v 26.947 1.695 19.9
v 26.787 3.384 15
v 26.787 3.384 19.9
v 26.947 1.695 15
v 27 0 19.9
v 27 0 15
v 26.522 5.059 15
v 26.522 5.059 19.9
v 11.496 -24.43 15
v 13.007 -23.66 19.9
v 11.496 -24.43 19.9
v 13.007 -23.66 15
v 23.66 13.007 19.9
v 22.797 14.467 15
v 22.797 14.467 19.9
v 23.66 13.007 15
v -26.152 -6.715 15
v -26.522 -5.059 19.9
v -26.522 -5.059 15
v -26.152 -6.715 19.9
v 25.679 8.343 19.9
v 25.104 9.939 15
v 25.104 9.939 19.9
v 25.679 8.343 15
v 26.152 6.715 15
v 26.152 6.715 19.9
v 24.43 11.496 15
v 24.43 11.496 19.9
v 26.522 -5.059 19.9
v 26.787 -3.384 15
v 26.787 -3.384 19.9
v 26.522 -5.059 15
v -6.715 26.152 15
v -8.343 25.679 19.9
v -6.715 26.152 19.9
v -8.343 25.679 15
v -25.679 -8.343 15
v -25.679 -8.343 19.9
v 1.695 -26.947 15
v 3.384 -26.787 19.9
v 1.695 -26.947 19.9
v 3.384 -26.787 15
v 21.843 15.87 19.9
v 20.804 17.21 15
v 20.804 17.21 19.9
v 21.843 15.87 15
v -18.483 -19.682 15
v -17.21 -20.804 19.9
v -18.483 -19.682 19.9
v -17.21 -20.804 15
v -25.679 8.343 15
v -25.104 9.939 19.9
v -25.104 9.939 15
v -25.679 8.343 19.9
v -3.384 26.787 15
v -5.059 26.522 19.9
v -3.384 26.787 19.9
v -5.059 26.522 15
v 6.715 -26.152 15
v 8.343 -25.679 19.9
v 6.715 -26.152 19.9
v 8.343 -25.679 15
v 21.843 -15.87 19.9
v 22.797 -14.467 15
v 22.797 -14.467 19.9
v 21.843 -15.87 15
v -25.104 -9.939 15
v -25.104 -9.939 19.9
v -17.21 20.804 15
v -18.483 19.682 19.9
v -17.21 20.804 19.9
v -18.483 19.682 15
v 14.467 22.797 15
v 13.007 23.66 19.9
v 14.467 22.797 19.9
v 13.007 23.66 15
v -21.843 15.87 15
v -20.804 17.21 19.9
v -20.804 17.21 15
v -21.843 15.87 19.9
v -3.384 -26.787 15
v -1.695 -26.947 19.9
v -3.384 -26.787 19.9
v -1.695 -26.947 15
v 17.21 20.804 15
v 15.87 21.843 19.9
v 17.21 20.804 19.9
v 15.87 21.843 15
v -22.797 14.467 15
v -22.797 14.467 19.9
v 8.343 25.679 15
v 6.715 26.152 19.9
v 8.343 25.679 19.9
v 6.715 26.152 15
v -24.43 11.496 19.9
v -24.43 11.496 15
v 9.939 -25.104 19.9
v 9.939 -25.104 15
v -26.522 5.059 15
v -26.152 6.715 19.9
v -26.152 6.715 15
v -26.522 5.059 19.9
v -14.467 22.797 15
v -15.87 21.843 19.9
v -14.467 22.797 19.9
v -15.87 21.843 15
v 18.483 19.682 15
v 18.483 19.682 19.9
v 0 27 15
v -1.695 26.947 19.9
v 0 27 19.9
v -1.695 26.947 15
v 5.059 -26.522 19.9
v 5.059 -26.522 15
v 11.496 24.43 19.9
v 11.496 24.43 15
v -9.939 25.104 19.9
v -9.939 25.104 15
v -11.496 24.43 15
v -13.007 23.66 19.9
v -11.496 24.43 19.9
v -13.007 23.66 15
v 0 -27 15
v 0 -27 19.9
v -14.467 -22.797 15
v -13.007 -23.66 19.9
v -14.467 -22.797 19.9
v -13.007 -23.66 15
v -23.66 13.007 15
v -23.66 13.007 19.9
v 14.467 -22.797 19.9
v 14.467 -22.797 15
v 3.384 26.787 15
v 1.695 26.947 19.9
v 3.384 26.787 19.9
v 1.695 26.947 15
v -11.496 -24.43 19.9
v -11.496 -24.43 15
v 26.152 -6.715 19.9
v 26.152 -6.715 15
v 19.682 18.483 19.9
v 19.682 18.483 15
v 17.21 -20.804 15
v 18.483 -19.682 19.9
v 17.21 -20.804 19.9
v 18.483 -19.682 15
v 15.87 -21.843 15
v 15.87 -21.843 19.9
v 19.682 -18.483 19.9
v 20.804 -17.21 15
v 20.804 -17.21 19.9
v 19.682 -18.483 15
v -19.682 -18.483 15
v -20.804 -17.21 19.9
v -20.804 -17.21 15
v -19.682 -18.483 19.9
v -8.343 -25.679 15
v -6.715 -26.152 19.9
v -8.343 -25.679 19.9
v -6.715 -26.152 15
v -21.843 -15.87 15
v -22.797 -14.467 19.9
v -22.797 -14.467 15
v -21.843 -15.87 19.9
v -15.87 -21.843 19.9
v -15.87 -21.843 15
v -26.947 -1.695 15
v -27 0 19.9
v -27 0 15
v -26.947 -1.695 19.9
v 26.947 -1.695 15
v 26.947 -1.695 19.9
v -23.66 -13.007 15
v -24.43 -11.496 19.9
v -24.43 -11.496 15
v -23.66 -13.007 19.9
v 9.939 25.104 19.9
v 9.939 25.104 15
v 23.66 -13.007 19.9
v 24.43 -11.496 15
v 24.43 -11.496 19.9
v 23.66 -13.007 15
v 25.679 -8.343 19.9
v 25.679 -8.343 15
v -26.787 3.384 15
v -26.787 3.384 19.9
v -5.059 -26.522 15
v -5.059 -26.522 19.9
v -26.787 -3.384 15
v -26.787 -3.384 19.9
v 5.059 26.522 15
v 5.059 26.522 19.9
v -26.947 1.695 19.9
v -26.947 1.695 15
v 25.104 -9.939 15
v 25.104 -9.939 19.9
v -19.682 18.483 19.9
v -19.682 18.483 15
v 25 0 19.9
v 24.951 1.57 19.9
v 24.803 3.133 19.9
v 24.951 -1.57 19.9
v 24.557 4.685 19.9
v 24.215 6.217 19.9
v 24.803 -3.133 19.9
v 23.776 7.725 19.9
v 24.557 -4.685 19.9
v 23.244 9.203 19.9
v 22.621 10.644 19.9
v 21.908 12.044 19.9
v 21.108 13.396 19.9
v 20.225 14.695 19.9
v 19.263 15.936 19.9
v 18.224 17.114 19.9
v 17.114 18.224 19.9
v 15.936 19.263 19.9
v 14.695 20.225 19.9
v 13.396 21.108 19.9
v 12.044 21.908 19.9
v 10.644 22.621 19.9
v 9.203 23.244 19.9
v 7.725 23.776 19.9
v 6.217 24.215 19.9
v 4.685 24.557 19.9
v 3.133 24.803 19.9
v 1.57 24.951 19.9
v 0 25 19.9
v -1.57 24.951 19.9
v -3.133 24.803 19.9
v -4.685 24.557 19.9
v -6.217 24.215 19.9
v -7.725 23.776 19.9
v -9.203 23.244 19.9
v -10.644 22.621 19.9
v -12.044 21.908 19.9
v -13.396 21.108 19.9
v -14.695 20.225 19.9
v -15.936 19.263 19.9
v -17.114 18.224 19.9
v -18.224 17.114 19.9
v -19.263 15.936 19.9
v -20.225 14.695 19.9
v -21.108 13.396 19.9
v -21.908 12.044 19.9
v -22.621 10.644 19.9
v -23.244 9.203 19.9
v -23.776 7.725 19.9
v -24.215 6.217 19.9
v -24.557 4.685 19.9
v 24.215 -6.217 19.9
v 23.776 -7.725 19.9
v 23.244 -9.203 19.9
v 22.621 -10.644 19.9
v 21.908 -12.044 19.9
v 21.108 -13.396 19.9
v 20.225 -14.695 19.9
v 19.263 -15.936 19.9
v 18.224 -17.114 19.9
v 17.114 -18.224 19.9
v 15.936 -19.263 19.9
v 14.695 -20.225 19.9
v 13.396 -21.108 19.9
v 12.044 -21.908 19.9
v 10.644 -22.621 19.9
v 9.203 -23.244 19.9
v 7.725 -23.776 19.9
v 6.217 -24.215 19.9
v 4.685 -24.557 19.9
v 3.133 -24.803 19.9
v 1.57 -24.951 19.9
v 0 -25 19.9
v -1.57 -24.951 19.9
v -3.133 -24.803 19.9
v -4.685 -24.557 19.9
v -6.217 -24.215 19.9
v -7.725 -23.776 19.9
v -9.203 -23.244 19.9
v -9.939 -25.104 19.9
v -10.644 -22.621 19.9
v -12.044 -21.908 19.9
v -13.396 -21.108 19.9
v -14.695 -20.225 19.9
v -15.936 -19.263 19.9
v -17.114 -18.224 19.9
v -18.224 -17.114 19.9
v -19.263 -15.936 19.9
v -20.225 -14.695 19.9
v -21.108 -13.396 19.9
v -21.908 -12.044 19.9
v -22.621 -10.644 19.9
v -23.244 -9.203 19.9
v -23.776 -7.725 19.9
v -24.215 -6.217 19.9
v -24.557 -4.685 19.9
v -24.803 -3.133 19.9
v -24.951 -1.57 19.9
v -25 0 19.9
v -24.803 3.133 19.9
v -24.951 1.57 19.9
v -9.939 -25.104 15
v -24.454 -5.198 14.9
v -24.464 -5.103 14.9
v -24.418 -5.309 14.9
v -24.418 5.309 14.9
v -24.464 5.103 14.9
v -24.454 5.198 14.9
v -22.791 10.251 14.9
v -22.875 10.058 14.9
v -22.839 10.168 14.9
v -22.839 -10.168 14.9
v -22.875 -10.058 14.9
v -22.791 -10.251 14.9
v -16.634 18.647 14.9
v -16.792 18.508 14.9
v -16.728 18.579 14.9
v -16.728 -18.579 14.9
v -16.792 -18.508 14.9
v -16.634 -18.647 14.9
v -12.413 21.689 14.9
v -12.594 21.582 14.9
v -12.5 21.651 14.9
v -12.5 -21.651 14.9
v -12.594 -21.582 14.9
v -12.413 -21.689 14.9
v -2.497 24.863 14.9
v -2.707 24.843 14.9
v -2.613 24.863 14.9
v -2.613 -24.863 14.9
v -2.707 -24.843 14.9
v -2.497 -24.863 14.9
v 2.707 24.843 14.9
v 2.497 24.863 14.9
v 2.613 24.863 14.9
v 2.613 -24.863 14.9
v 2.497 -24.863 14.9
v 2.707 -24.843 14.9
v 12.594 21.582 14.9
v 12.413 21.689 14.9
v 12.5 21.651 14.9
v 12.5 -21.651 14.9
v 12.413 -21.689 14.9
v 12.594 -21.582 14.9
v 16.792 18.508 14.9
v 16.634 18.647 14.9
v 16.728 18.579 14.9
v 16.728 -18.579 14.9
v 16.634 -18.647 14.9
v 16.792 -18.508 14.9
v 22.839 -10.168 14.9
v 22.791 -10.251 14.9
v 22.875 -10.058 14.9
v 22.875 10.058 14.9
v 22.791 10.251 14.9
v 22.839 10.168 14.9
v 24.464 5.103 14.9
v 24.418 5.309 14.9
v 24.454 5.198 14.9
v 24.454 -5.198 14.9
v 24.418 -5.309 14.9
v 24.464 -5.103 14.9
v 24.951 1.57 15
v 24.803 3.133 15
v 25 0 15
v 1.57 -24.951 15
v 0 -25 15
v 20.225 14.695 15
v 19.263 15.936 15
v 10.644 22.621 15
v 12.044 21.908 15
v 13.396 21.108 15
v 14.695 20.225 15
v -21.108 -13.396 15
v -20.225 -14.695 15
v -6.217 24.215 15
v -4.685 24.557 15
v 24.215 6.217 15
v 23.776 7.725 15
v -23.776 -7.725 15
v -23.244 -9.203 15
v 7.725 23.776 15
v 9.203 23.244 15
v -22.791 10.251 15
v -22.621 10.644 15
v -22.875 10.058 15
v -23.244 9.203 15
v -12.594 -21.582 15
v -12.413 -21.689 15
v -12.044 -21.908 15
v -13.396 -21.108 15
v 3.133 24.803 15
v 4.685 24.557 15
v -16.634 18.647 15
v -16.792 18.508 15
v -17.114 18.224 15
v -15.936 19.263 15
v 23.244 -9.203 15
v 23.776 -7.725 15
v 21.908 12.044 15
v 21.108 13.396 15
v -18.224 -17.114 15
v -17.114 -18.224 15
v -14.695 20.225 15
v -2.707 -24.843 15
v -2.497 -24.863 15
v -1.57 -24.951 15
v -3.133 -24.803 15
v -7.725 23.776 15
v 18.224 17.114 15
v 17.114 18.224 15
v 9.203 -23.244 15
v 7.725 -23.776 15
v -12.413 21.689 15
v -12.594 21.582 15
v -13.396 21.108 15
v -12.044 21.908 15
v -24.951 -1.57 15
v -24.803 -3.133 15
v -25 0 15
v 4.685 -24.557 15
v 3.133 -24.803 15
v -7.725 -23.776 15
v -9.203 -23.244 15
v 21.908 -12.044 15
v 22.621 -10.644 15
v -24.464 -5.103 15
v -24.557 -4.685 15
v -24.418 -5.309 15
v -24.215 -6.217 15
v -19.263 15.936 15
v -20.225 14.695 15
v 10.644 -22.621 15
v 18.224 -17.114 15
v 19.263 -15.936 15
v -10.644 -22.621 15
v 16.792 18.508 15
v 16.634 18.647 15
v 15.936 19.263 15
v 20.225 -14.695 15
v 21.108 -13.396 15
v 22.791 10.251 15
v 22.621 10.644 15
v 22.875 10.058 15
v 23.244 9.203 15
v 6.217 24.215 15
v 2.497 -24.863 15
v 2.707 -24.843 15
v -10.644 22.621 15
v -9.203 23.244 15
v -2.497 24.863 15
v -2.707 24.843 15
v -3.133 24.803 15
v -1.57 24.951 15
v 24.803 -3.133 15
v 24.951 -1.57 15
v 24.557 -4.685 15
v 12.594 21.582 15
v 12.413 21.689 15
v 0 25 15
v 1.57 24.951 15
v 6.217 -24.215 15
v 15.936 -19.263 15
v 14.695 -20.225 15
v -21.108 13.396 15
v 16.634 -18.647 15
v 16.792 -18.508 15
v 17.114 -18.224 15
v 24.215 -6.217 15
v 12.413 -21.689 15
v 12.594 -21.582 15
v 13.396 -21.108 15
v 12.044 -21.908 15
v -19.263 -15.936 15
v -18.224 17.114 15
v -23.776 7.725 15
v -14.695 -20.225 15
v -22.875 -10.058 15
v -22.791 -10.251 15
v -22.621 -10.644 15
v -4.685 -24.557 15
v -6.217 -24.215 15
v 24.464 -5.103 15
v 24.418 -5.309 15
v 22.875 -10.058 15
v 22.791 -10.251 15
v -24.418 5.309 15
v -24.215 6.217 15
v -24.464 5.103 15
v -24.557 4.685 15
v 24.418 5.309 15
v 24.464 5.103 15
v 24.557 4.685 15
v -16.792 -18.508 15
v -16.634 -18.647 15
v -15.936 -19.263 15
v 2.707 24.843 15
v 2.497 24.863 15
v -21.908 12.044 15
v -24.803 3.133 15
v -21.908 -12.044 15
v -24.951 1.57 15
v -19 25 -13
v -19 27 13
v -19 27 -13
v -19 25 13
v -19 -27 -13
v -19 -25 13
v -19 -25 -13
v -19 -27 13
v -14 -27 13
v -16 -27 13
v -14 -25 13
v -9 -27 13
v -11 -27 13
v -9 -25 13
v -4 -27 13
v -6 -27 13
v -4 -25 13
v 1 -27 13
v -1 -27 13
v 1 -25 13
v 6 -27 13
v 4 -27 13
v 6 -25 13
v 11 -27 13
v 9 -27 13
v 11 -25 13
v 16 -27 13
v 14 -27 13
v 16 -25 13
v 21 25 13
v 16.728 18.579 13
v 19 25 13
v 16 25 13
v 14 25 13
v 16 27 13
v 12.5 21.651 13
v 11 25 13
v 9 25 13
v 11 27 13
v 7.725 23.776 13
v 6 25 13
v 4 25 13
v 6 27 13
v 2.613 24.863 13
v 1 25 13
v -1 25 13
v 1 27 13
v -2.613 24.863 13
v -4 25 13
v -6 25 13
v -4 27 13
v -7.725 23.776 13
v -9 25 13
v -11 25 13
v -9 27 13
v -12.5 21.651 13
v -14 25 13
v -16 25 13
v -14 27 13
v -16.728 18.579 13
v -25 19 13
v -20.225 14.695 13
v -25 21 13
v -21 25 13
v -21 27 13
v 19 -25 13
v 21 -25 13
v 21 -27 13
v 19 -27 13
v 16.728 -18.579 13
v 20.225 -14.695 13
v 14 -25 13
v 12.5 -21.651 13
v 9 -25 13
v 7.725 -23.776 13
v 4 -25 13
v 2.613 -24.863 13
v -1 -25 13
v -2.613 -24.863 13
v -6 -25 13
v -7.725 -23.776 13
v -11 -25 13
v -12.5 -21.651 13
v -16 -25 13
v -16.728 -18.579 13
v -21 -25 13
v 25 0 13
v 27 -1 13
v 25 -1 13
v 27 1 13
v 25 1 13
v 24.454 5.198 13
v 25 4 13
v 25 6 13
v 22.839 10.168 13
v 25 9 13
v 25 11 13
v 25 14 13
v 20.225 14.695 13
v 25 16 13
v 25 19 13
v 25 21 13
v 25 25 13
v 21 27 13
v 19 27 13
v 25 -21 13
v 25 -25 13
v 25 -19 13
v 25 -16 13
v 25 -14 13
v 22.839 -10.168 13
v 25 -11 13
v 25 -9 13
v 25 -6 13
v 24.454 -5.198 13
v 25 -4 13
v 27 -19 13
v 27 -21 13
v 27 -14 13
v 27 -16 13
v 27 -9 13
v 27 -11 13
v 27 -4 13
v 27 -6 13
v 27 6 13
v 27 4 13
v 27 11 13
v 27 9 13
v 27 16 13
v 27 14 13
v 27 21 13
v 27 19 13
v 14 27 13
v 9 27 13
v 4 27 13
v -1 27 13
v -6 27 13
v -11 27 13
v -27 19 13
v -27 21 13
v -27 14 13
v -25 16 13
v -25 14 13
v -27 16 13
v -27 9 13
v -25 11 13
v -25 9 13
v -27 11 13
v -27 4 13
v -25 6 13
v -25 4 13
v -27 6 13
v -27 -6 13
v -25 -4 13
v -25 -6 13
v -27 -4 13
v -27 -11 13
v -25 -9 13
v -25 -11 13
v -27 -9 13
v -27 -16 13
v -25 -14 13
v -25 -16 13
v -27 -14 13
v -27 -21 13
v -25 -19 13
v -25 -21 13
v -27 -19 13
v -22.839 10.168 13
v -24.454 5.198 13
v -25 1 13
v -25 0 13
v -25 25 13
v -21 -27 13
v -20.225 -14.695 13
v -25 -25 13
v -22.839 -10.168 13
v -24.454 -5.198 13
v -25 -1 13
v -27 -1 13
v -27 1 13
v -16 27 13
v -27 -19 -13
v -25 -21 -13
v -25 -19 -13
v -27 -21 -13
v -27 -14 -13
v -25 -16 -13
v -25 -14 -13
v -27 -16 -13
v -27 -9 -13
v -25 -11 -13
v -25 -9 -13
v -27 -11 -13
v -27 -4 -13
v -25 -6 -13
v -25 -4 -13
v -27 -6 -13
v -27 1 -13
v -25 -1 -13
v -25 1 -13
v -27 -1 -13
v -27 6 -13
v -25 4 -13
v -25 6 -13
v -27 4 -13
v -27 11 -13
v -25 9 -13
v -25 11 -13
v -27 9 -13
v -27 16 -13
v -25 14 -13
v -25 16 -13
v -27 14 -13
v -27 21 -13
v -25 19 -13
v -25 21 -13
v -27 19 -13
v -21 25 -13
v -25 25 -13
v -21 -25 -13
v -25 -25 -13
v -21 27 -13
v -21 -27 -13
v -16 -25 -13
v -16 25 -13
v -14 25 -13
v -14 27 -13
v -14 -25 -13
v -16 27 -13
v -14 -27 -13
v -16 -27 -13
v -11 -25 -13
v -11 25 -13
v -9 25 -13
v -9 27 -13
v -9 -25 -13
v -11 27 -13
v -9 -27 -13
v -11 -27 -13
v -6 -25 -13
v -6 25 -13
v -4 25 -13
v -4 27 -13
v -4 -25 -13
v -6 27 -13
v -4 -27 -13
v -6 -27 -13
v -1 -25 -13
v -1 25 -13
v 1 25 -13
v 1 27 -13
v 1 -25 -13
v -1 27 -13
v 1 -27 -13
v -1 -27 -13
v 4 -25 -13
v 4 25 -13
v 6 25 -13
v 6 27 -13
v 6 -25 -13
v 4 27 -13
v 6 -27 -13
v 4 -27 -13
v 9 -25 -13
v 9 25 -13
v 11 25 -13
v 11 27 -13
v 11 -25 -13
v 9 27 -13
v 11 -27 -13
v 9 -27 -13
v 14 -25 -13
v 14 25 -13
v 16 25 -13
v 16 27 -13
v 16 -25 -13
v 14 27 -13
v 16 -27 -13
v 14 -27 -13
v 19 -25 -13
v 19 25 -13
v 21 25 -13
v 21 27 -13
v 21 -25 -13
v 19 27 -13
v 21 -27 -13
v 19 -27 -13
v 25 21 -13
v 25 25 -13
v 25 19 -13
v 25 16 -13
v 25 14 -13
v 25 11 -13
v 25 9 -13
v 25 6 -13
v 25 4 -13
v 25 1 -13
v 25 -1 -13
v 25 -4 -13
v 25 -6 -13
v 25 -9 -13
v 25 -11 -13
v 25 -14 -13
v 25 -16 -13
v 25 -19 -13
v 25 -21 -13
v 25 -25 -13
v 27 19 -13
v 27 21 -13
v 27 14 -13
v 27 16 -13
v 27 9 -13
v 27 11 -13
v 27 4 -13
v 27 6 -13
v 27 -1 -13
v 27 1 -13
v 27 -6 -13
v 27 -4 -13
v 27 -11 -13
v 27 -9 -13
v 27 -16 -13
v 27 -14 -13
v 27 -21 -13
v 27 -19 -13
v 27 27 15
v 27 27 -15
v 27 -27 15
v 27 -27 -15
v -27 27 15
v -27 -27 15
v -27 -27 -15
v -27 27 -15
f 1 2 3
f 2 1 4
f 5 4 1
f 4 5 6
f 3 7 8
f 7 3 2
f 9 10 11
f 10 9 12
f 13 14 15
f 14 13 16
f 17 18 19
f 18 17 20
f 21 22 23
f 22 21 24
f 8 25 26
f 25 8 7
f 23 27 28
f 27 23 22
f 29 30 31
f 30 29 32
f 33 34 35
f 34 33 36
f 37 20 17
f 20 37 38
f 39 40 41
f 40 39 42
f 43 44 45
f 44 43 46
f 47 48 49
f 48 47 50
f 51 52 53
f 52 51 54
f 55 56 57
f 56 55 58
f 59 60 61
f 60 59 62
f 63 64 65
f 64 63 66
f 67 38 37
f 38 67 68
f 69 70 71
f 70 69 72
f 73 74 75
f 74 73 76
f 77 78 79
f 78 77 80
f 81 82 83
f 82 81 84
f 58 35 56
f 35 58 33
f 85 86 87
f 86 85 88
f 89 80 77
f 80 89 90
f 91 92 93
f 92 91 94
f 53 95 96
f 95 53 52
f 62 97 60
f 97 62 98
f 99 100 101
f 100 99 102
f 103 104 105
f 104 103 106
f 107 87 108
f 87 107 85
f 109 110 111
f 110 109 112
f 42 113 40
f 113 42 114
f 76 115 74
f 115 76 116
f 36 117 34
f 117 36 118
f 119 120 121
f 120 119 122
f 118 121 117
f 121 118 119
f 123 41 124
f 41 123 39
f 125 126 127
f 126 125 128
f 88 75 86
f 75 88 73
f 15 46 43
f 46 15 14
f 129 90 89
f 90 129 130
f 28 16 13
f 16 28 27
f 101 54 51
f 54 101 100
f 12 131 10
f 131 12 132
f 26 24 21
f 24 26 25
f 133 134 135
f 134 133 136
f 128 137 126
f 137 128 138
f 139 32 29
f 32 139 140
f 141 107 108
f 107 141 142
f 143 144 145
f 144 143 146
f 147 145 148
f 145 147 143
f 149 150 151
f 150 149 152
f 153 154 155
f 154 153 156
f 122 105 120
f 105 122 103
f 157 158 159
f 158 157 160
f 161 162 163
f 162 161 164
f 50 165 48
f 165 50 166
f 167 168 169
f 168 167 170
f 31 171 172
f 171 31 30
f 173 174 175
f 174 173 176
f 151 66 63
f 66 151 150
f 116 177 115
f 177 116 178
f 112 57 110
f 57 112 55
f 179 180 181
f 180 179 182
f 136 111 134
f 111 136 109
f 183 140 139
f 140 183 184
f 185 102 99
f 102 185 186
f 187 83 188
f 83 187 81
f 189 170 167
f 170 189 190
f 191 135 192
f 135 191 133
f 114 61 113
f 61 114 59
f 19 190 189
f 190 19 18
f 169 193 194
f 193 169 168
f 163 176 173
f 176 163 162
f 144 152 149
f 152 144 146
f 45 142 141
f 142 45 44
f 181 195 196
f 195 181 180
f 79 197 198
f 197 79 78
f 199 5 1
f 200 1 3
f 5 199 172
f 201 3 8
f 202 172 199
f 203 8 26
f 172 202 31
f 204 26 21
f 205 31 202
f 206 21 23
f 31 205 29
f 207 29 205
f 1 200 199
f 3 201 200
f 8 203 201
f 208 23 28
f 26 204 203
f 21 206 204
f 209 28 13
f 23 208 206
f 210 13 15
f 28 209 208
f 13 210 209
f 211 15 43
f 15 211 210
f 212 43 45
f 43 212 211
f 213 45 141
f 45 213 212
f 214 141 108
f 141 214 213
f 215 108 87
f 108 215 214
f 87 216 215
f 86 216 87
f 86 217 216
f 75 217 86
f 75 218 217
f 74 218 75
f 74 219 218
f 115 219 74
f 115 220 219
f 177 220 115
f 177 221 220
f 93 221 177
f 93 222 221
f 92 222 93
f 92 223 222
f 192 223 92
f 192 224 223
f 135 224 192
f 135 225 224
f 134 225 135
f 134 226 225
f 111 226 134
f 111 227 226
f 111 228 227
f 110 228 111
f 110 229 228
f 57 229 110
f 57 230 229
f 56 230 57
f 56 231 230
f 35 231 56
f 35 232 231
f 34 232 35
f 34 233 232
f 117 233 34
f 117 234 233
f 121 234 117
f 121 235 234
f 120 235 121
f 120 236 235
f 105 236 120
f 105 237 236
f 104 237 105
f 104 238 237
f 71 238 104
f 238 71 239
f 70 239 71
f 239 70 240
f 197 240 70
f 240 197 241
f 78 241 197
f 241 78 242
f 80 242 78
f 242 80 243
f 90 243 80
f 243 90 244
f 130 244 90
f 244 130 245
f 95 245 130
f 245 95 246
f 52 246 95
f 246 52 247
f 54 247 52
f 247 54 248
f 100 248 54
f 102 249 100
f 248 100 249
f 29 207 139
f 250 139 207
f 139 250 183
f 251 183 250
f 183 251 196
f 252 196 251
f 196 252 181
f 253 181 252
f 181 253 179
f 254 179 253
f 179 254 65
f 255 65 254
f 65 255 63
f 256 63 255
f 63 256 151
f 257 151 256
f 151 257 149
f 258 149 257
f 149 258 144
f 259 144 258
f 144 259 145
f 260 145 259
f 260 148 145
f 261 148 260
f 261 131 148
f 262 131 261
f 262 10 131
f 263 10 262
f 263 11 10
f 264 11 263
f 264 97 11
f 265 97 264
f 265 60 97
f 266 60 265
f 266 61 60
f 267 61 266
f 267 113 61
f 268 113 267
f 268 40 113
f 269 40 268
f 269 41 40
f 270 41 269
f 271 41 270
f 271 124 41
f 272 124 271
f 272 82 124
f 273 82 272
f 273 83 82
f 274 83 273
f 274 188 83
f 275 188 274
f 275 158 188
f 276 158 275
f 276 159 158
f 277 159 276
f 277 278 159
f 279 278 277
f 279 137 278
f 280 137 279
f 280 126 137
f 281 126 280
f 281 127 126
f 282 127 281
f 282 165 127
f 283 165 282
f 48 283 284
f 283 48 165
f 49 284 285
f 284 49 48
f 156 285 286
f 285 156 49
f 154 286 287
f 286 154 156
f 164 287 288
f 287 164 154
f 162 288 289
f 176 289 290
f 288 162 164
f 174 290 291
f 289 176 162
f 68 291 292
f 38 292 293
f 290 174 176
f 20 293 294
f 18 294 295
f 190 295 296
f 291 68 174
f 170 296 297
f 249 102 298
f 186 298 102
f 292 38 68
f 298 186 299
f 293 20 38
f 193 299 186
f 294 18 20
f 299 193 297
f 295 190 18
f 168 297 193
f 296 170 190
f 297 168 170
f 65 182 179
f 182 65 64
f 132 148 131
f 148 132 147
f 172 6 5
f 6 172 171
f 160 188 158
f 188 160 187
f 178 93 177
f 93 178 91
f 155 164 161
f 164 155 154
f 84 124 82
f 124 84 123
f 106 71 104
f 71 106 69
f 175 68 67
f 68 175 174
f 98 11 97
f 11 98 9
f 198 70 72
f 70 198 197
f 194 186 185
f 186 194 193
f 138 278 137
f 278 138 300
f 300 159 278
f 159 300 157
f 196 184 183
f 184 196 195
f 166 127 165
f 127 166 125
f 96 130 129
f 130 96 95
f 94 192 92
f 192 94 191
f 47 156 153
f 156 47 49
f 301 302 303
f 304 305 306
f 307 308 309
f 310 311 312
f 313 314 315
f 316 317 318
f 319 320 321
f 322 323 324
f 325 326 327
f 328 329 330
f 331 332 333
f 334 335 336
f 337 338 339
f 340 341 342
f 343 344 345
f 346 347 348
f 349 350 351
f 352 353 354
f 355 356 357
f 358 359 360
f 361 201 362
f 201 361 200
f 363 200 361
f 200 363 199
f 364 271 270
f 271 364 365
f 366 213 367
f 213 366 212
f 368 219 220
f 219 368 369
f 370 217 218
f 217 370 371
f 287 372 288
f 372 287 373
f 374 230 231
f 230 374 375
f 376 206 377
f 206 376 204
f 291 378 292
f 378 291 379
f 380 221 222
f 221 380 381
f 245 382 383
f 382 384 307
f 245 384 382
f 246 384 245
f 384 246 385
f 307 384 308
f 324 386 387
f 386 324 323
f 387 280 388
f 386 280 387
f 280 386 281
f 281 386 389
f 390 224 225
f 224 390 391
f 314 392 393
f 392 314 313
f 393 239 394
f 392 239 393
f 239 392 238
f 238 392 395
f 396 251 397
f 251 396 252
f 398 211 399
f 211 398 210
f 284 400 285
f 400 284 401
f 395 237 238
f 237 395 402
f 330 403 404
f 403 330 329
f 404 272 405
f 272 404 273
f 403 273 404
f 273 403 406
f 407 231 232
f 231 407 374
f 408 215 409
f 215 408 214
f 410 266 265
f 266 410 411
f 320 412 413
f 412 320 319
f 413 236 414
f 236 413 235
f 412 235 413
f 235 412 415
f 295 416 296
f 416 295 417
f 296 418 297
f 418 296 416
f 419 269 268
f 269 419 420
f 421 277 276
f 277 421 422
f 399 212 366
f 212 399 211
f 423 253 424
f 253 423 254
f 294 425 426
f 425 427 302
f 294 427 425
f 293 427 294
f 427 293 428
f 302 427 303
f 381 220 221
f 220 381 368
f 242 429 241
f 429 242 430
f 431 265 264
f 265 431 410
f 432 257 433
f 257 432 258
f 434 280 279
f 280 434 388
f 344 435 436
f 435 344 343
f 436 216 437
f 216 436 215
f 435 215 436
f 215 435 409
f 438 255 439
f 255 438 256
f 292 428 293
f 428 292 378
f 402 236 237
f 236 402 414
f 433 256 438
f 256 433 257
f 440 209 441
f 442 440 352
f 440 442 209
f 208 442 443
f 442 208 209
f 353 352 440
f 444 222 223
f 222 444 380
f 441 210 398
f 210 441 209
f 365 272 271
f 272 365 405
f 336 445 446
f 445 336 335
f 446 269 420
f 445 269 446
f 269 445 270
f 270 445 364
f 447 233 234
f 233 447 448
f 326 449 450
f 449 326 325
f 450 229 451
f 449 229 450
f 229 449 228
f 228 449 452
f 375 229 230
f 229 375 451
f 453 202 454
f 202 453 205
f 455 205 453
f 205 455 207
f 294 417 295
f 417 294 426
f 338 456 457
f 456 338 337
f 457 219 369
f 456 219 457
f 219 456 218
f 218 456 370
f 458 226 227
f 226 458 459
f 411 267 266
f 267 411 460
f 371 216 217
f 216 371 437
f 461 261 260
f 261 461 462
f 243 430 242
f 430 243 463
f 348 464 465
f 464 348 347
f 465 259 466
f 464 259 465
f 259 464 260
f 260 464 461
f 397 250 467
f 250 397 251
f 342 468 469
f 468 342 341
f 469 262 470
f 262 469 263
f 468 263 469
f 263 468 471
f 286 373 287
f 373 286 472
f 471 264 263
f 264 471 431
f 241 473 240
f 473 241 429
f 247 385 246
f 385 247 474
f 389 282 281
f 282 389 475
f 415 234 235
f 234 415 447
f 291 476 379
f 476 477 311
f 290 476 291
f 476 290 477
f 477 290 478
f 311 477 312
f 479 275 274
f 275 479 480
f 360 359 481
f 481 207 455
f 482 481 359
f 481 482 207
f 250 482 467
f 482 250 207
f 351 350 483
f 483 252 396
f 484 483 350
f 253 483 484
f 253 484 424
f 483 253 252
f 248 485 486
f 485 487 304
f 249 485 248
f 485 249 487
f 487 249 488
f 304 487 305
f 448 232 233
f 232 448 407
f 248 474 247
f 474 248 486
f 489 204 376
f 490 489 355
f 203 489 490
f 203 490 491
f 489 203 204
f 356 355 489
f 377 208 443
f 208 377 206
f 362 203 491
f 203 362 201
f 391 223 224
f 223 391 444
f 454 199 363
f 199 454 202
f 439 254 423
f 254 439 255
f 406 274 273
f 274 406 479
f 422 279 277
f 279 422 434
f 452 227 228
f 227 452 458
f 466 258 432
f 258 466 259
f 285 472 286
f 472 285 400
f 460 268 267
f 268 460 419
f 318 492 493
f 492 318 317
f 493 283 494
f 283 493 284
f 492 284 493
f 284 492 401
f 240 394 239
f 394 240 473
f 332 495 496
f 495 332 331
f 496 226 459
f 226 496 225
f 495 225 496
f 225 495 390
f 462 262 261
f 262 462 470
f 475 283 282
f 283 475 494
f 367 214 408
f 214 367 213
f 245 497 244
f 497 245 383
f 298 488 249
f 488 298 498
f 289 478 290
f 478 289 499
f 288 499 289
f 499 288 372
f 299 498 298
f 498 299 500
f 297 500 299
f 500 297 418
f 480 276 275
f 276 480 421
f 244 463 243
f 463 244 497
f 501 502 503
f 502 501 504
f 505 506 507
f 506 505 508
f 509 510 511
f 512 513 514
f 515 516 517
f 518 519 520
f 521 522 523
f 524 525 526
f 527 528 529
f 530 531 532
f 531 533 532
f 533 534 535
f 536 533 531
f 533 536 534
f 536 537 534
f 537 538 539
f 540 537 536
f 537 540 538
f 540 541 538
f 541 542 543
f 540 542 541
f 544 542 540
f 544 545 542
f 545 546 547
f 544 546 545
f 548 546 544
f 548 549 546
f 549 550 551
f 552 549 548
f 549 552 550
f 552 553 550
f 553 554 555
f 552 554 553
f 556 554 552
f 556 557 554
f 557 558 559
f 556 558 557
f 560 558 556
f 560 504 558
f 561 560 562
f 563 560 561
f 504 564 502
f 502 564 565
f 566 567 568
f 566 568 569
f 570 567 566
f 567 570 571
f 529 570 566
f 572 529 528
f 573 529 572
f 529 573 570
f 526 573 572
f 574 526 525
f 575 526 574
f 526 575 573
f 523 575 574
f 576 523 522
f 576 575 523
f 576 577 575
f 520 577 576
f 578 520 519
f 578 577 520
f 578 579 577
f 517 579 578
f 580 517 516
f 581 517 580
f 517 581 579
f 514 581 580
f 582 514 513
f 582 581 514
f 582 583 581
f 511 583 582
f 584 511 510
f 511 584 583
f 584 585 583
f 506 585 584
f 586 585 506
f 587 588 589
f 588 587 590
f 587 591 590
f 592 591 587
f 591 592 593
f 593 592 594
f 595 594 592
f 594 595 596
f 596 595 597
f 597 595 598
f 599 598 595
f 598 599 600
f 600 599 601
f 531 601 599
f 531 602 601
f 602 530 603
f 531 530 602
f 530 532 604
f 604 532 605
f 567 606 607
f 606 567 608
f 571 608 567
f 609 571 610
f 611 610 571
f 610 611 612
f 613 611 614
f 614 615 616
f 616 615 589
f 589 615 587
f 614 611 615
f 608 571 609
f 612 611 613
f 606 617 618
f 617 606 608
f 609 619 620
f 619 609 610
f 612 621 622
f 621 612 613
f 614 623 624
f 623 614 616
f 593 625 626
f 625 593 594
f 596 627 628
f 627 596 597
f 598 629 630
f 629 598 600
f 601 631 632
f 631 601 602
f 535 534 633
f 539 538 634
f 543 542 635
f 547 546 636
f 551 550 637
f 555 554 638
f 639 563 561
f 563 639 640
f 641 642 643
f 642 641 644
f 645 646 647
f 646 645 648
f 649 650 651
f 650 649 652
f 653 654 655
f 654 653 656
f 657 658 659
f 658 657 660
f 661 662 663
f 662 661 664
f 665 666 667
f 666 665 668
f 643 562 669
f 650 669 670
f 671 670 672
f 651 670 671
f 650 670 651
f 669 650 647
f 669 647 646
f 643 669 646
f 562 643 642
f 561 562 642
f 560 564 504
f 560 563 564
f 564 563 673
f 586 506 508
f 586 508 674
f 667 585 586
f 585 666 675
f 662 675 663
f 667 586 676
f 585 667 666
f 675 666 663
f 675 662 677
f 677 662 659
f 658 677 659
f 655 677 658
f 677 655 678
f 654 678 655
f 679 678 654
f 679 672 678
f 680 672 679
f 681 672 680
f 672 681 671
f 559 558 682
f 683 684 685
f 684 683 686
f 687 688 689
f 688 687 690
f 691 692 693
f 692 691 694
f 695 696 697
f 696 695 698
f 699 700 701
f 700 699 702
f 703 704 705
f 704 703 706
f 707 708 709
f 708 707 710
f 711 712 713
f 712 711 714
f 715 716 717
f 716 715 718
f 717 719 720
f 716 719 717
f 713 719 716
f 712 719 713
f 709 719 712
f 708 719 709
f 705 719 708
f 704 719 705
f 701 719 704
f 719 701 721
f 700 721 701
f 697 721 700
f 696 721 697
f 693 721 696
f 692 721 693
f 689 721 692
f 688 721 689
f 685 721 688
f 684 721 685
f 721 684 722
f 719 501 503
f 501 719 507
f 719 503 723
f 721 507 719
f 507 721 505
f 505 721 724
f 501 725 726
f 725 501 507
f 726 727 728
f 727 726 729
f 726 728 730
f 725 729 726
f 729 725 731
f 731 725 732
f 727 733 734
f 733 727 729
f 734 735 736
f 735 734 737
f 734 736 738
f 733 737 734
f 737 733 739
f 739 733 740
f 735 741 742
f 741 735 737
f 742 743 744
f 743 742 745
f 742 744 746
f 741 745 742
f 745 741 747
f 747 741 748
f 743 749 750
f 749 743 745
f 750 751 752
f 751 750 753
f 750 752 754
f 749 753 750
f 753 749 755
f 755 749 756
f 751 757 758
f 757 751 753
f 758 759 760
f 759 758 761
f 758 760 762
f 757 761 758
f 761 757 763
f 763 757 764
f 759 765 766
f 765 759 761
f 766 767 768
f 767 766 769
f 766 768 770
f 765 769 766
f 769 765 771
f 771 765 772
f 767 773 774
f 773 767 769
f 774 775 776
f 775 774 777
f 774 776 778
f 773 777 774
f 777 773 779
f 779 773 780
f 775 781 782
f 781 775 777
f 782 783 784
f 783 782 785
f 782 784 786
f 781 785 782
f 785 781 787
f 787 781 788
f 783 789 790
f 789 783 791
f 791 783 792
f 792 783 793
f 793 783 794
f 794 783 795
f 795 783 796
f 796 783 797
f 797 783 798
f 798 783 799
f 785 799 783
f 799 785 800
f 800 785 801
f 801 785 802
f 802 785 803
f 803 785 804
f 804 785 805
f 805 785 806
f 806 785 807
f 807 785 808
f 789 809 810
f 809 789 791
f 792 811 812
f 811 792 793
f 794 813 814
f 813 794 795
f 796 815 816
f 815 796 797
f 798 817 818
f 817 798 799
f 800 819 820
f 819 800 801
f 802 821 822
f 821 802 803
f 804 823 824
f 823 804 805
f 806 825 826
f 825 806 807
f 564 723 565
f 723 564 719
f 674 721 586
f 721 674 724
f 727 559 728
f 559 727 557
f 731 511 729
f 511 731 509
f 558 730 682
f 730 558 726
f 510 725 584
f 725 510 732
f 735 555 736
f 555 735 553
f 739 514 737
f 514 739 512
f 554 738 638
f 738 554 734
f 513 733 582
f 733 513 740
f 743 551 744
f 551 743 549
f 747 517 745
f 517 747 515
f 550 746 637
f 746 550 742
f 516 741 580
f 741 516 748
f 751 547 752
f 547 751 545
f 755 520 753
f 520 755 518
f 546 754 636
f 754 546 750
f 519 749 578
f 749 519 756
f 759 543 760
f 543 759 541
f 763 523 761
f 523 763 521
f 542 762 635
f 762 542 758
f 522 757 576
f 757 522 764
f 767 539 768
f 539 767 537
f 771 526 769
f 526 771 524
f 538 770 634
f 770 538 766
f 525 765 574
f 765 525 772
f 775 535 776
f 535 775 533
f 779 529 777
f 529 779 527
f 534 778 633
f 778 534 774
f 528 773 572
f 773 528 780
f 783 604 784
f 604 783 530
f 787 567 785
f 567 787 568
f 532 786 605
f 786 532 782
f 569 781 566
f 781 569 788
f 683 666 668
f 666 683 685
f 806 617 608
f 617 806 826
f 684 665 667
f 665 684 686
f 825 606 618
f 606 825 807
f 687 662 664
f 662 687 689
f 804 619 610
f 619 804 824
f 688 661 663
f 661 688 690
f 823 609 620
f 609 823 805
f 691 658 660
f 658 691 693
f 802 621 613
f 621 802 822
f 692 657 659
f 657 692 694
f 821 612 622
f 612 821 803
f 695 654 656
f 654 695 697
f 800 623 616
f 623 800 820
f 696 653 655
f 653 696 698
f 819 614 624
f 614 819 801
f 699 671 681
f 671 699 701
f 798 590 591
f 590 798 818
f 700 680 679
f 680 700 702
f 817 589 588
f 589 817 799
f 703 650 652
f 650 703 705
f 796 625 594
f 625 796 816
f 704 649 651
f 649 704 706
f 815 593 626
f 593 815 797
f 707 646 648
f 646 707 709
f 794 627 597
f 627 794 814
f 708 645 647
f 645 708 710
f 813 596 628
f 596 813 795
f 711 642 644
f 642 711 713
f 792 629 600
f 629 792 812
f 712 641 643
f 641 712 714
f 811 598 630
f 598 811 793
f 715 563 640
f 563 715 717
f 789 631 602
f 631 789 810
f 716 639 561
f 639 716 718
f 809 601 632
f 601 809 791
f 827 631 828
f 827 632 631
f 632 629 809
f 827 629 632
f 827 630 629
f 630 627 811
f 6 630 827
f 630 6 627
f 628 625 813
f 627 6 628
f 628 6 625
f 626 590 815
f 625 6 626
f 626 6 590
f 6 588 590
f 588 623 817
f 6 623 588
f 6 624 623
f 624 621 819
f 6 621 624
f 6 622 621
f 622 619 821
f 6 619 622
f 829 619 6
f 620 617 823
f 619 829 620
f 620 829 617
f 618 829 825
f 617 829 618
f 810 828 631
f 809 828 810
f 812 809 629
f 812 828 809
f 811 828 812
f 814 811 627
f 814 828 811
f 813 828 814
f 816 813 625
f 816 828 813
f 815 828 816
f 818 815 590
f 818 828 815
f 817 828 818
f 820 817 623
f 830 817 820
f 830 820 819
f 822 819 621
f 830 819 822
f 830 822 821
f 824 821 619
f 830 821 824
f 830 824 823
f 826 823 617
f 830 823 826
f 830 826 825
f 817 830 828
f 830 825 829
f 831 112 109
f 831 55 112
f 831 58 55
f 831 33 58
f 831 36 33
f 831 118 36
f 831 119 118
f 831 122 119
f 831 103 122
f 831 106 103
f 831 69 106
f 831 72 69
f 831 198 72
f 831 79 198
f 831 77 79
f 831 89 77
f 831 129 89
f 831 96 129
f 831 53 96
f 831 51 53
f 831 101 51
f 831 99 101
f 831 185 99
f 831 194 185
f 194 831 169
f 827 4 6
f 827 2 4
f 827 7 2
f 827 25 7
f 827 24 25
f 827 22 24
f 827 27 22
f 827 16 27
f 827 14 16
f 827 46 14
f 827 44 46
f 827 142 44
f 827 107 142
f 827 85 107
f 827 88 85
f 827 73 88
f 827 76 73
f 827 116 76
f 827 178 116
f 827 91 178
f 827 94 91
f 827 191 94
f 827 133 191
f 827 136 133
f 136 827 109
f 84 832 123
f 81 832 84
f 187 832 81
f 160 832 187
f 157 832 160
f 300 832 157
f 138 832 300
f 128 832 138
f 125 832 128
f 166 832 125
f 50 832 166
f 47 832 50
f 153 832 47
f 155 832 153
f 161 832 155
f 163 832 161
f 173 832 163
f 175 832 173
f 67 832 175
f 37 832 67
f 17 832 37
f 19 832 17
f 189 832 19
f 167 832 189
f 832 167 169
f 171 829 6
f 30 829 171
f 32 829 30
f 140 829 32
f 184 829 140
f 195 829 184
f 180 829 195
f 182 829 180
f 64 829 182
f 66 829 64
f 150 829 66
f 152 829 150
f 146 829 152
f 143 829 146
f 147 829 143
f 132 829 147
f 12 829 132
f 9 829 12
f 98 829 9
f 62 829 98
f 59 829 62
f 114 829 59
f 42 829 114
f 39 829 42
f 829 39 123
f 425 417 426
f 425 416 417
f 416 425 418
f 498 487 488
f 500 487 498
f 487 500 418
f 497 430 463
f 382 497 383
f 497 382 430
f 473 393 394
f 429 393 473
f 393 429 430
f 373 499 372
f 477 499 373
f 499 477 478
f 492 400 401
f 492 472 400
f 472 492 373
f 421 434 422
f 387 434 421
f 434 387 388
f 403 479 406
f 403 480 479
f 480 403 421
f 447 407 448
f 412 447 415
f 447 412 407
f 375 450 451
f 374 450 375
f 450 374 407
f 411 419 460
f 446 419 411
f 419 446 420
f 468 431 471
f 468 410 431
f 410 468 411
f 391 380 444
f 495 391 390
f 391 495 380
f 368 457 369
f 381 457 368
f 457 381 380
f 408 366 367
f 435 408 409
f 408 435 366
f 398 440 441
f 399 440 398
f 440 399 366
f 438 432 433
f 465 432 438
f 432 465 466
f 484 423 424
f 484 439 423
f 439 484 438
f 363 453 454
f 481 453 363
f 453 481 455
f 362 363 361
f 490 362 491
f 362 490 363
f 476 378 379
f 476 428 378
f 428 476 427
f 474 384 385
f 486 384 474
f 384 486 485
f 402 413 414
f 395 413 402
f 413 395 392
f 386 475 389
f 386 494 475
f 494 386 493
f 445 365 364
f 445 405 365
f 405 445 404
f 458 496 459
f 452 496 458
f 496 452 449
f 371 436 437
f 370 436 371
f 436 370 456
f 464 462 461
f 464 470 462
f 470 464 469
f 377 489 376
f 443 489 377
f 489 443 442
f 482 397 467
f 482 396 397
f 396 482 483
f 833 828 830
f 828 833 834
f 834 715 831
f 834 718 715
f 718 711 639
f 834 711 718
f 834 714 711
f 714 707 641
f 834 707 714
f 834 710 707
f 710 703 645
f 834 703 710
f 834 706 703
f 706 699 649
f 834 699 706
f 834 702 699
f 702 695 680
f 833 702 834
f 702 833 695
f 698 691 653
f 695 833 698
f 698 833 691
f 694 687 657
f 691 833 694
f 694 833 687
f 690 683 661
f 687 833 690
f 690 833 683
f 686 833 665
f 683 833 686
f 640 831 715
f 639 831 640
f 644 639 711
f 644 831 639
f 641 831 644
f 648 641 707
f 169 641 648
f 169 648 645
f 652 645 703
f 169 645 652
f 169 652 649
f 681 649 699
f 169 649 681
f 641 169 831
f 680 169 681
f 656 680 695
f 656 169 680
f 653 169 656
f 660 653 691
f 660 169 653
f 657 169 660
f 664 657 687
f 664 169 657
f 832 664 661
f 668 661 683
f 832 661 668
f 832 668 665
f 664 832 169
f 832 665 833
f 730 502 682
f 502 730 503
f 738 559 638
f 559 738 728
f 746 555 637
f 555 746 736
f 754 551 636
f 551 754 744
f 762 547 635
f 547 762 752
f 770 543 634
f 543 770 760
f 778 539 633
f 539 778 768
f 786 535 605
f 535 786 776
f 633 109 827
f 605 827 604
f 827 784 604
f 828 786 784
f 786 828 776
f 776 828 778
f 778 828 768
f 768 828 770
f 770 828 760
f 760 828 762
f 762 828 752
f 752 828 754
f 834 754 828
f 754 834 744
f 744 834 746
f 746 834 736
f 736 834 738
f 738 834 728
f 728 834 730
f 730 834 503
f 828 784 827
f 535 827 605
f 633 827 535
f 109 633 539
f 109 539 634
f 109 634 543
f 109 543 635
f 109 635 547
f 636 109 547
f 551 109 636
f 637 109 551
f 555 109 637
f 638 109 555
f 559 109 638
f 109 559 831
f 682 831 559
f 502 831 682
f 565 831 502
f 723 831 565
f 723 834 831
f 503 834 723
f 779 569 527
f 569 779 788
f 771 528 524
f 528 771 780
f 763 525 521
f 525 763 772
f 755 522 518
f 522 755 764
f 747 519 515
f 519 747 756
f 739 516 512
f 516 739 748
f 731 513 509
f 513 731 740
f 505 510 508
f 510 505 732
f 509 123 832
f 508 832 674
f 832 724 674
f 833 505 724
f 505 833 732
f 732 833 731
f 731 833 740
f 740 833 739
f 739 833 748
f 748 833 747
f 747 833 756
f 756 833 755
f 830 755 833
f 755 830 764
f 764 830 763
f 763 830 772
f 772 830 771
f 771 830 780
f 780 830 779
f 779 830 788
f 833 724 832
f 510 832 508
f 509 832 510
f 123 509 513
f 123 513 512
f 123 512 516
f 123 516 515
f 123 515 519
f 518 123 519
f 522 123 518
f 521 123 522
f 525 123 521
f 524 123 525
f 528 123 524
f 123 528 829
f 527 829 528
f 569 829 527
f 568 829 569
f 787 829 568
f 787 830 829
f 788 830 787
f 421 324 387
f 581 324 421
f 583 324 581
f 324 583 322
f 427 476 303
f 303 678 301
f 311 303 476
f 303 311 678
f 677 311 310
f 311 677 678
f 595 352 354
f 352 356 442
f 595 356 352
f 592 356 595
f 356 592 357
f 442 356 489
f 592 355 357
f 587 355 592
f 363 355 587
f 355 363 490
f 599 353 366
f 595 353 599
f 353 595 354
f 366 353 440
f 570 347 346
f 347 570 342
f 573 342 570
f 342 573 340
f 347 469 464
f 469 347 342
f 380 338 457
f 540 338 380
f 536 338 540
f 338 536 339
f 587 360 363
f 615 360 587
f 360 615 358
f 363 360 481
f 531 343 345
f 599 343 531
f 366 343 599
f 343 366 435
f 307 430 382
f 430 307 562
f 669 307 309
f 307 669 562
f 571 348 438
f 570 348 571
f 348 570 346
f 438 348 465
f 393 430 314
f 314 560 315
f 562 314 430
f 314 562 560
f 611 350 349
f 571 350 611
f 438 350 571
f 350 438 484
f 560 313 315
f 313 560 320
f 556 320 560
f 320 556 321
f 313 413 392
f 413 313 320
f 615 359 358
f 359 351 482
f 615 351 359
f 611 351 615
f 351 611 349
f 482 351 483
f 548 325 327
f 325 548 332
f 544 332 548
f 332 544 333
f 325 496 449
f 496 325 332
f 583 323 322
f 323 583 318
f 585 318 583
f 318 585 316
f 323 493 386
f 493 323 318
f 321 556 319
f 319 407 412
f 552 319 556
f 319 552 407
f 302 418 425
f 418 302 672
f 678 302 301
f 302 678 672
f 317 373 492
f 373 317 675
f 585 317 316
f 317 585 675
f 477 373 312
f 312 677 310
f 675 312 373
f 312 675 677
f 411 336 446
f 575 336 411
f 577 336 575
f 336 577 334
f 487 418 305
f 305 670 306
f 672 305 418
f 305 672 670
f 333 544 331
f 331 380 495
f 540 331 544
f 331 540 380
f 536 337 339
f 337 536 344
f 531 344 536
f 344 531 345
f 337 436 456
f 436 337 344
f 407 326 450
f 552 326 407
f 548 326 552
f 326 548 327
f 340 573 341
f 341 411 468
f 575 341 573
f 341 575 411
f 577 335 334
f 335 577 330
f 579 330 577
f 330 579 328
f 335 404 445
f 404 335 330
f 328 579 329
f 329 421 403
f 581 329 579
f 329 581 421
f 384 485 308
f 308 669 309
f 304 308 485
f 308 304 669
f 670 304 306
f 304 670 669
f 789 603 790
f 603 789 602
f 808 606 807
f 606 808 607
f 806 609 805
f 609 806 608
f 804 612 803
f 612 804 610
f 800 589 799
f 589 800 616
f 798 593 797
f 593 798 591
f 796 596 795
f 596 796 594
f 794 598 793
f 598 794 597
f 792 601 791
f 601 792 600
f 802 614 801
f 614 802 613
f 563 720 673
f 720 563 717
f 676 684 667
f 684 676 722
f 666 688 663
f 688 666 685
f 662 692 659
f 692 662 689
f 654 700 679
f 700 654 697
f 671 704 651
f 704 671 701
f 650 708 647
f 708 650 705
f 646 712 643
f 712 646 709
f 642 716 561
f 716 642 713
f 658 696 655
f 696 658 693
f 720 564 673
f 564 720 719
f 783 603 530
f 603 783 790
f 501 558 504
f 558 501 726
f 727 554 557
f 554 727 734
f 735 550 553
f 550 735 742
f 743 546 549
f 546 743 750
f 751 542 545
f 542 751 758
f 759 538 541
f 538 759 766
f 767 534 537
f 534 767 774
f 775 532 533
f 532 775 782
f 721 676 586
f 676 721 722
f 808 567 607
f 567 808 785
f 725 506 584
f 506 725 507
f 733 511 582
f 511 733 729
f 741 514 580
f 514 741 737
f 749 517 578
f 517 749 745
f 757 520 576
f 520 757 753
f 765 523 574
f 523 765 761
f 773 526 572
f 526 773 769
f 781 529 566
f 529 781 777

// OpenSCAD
// file: ../../../../shapes/open-cylinder/open-cylinder.scad
// // TODO: Lower this to 50.
module openCylinder(height = 3,
                    outerRadius = 7,
                    innerRadius = 4.5,
                    fn = 100)
{
echo("hi oc");    
    $fn = fn;

    difference()
    {
        cylinder(r=outerRadius,
                 h=height);

        translate([0, 0, -1])
        cylinder(r=innerRadius,
                 h=height+1.01);
    }
}
// file: ../../water-pump-filter.scad
use <../../shapes/open-cylinder/open-cylinder.scad>

module waterPumpFilter(baseHeight = 30,
					   innerRadius = 25)
{
	union()
	{
		zTranslate = baseHeight / 2.0;
		translate([0,0, zTranslate-0.1])
		waterPumpFilter_connector(innerRadius = innerRadius);

		xyLength = (innerRadius * 2) + 4;
		waterPumpFilter_base(height = baseHeight,
							 innerRadius = innerRadius,
							 xLength = xyLength,
							 yLength = xyLength);
	}
}

module waterPumpFilter_connector(innerRadius)
{
	openCylinder(height = 5,
				 innerRadius = innerRadius,
				 outerRadius = innerRadius + 2);
}

module waterPumpFilter_base(height,
														innerRadius,
														xLength,
														yLength)
{
	difference()
	{
		// this is the outer cube
		cube([xLength, yLength, height], center = true);

		color("pink")
		translate([0,0,10])
		cylinder(r=innerRadius, h=30, center=true);

		innerCubeDifference = 4;
		color("green")
		waterPumpFilter_base_innerCube(xLength - innerCubeDifference, height - innerCubeDifference);

		cutoutHeight = height - 4;

		waterPumpFilter_xCutouts(height = cutoutHeight);

		waterPumpFilter_yCutouts(height = cutoutHeight);
	}
}

module waterPumpFilter_base_innerCube(xyLength, height)
{
	cube([xyLength, xyLength, height], center = true);
}

module waterPumpFilter_xCutouts(height)
{
	step = 5;

	for(x = [-20 : step : 20])
	{
		translate([x, 0, 0])
		cube([2, 100, height], center = true);
	}
}

module waterPumpFilter_yCutouts(height)
{
	step = 5;

	for(y = [-20 : step : 20])
	{
		translate([0, y, 0])
		cube([100, 2, height], center = true);
	}
}
// main file
use <../../water-pump-filter.scad>

// outer diameter: 5/16" = 7.94mm
snorkelOuterRadius = 7.94 / 2.0;

waterPumpFilter(snorkel = true,
				snorkelOuterRadius = snorkelOuterRadius,
				xLength = 100);
